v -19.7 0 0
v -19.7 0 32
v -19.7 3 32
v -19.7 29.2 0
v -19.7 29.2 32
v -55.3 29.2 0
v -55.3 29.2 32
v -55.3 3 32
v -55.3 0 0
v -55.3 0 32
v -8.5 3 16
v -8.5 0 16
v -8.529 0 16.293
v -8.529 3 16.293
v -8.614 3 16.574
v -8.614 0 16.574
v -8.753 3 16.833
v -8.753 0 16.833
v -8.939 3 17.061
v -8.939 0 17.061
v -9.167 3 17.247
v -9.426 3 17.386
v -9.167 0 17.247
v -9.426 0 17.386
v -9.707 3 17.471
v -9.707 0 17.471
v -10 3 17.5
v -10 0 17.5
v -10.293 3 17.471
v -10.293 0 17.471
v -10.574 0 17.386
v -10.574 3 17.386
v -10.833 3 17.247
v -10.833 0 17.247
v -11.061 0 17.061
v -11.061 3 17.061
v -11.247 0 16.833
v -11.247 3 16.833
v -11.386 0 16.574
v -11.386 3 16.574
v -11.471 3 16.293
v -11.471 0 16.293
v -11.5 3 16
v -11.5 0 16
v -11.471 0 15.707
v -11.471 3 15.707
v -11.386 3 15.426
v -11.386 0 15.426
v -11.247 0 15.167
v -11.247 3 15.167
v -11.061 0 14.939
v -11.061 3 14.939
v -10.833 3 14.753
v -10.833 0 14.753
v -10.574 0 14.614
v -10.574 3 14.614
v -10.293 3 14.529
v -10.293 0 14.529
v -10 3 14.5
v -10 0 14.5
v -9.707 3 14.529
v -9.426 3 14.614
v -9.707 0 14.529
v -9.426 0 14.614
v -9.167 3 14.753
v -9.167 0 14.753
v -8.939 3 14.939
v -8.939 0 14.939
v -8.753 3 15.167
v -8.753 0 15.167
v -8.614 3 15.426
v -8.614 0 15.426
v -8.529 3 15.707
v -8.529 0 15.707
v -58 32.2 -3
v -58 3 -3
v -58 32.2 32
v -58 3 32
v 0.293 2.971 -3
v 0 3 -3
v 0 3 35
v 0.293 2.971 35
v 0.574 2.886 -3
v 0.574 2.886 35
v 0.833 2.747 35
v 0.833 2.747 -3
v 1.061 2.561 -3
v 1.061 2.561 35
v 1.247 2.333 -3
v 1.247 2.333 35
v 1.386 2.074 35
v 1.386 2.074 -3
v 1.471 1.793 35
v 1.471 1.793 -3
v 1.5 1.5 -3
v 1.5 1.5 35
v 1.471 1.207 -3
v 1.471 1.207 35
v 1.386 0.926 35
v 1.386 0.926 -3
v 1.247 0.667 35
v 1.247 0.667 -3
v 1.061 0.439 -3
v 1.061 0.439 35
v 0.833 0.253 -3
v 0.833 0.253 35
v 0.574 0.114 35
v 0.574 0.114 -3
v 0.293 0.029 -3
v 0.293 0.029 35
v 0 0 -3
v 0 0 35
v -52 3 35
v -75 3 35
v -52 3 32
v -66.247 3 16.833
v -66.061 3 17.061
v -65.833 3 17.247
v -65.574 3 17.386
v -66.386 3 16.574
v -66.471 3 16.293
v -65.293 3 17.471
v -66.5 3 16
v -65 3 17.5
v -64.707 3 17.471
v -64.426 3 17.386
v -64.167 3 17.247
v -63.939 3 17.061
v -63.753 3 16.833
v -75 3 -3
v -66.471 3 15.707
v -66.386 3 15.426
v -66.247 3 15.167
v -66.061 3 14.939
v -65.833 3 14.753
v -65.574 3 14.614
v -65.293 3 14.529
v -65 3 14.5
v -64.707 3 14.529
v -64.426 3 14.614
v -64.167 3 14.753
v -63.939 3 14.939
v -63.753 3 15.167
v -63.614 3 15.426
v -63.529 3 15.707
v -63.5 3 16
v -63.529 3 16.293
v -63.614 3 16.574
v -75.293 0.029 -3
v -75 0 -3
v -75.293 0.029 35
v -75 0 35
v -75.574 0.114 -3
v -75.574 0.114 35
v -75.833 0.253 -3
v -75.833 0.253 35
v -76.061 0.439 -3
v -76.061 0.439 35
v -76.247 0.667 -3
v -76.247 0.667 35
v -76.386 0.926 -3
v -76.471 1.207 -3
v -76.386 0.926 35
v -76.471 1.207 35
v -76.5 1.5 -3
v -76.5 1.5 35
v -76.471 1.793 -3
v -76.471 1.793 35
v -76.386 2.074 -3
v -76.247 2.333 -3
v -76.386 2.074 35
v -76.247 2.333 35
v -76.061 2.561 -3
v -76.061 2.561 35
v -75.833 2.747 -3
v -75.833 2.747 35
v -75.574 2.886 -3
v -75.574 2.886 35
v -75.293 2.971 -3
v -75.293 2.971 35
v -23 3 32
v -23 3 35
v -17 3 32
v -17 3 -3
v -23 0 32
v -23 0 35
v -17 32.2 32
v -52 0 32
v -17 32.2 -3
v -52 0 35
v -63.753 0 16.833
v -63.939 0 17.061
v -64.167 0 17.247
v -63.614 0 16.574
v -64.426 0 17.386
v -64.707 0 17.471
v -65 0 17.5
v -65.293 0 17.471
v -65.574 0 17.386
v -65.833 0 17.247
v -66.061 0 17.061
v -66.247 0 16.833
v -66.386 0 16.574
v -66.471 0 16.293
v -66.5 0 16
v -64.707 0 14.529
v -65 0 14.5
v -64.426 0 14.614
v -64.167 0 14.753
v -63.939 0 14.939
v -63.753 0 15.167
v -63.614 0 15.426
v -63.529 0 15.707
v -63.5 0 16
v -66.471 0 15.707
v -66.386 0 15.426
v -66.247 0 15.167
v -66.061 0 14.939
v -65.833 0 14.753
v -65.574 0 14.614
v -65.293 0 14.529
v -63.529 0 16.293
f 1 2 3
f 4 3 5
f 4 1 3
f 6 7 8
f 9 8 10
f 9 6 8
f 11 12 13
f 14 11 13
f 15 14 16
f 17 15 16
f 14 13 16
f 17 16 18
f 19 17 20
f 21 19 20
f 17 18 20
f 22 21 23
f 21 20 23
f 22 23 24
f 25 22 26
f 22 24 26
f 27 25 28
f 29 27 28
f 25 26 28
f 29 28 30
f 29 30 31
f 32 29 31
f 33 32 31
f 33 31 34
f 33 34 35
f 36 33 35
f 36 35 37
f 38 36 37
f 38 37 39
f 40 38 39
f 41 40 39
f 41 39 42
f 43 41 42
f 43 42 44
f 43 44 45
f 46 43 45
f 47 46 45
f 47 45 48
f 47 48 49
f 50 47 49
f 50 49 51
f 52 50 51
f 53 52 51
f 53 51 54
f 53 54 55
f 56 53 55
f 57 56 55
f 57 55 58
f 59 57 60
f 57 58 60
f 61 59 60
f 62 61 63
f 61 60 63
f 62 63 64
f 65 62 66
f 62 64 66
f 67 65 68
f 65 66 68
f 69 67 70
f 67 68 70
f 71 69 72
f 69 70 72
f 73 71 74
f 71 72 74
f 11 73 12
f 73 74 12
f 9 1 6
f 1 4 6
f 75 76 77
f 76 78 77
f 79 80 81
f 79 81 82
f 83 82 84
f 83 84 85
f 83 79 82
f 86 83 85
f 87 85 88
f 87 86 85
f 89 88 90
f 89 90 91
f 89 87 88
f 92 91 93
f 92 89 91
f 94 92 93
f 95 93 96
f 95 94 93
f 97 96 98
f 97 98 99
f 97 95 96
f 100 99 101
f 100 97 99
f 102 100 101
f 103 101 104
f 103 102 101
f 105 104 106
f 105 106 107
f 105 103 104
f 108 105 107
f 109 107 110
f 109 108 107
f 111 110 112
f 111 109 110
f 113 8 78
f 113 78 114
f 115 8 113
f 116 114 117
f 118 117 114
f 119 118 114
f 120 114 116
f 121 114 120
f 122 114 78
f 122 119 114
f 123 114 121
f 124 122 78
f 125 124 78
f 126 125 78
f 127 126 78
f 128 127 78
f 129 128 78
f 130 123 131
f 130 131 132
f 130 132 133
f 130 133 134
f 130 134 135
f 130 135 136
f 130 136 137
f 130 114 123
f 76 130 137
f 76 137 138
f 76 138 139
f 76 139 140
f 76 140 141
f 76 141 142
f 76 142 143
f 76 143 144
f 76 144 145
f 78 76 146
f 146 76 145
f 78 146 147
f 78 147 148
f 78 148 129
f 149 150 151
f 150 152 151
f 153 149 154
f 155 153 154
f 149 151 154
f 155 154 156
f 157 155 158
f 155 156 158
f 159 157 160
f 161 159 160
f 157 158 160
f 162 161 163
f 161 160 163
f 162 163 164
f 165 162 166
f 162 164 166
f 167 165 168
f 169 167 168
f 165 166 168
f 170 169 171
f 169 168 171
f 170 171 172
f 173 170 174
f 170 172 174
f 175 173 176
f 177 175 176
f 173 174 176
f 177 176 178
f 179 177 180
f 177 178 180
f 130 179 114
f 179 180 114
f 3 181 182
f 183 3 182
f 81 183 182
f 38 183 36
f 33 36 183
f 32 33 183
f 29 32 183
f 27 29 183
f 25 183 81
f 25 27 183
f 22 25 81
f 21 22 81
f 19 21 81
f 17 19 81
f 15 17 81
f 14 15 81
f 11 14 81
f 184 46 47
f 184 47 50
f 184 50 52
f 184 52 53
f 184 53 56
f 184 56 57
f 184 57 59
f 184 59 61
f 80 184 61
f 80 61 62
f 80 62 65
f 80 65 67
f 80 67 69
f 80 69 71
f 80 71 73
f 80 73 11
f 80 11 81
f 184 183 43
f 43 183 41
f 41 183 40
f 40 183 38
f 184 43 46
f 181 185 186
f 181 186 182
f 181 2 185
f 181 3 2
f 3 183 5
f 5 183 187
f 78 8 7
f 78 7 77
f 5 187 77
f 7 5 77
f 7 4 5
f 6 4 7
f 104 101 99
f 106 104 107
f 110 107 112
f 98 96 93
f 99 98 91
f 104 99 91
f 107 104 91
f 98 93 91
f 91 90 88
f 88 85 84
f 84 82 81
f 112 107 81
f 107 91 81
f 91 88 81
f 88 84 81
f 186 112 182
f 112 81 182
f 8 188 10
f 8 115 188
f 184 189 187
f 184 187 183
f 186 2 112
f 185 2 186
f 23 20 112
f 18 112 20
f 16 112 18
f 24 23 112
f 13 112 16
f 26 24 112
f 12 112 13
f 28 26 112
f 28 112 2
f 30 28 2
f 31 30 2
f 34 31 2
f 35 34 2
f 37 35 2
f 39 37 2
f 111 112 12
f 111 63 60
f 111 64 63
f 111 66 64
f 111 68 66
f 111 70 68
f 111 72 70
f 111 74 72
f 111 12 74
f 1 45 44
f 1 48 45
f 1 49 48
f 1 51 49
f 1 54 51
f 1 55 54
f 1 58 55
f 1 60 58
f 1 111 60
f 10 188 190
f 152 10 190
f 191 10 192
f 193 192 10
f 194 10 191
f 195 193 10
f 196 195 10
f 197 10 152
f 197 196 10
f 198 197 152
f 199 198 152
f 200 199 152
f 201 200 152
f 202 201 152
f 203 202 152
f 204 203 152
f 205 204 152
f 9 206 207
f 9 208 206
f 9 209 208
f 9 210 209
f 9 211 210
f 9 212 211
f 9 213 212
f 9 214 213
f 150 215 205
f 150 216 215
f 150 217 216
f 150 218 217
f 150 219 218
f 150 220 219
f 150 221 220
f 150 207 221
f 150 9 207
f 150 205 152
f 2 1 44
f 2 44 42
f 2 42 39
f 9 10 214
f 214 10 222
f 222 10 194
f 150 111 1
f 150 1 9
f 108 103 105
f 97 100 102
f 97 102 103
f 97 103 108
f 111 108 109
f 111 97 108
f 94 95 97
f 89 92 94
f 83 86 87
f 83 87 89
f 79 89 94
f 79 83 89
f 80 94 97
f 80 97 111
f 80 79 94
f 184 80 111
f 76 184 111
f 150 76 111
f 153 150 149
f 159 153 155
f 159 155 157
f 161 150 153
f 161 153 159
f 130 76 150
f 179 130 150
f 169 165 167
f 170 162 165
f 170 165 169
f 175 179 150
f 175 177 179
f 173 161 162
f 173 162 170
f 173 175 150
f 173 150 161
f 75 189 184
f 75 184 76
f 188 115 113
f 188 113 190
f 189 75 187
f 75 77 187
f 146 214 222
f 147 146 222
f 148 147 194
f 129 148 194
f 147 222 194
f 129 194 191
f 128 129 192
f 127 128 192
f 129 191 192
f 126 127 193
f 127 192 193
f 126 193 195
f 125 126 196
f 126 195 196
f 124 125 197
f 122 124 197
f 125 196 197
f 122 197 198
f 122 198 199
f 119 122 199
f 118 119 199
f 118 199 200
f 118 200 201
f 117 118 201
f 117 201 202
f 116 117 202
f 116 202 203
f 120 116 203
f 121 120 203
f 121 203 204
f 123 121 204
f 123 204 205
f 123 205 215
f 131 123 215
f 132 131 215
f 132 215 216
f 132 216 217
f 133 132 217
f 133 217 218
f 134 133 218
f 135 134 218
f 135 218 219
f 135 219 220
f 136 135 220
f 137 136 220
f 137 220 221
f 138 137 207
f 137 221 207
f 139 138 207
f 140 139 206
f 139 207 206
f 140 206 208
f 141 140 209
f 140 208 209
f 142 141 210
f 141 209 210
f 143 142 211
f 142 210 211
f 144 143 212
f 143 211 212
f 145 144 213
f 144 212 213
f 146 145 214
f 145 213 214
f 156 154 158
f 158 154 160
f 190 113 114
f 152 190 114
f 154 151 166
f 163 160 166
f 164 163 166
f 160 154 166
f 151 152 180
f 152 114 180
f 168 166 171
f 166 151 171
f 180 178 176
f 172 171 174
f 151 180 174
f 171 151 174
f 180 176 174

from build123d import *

# Parameters (mm, degrees)
BOSS_EXTRUDE1_DEPTH = 32
SKETCH2_W           = 35.6
SKETCH2_H           = 29.2
BOSS_EXTRUDE2_DEPTH = 3
BOSS_EXTRUDE3_DEPTH = 3
SKETCH4_R           = 1.5
CUT_EXTRUDE1_DEPTH  = 4


with BuildPart() as part:
    # Sketch1 → Boss-Extrude1 (new body)
    with BuildSketch(Plane.XY):
        with BuildLine():
            Line((0, 0), (-19.7, 0))
            Line((-19.7, 0), (-19.7, 29.2))
            Line((-19.7, 29.2), (-20, 29.2))
            Line((-20, 29.2), (-55, 29.2))
            Line((-55, 29.2), (-55.3, 29.2))
            Line((-55.3, 29.2), (-55.3, 0))
            Line((-55.3, 0), (-75, 0))
            ThreePointArc((-75, 0), (-76.5, 1.5), (-75, 3))
            Line((-75, 3), (-58, 3))
            Line((-58, 3), (-58, 30.2))
            Line((-58, 30.2), (-58, 32.2))
            Line((-58, 32.2), (-17, 32.2))
            Line((-17, 32.2), (-17, 30.2))
            Line((-17, 30.2), (-17, 3))
            Line((-17, 3), (0, 3))
            ThreePointArc((0, 3), (1.5, 1.5), (0, 0))
        make_face()
    extrude(amount=BOSS_EXTRUDE1_DEPTH)

    # Sketch2 → Boss-Extrude2 (add)
    with BuildSketch(Plane(origin=(0, 0, 0), x_dir=(-1, 0, 0), z_dir=(0, 0, -1))):
        with Locations((37.5, 14.6)):
            Rectangle(SKETCH2_W, SKETCH2_H)
        with BuildLine():
            Line((17, 3), (0, 3))
            ThreePointArc((0, 3), (-1.5, 1.5), (0, 0))
            Line((0, 0), (19.7, 0))
            Line((19.7, 0), (19.7, 29.2))
            Line((19.7, 29.2), (55.3, 29.2))
            Line((55.3, 29.2), (55.3, 0))
            Line((55.3, 0), (75, 0))
            ThreePointArc((75, 0), (76.5, 1.5), (75, 3))
            Line((75, 3), (58, 3))
            Line((58, 3), (58, 32.2))
            Line((58, 32.2), (17, 32.2))
            Line((17, 32.2), (17, 3))
        make_face()
    extrude(amount=BOSS_EXTRUDE2_DEPTH)

    # Sketch3 → Boss-Extrude3 (add)
    with BuildSketch(Plane.XY.offset(32)):
        with BuildLine():
            Line((-20, 0), (-23, 0))
            Line((-23, 0), (-23, 3))
            Line((-23, 3), (-20, 3))
            Line((-20, 3), (0, 3))
            ThreePointArc((0, 3), (1.5, 1.5), (0, 0))
            Line((0, 0), (-20, 0))
        make_face()
        with BuildLine():
            Line((-55, 0), (-75, 0))
            ThreePointArc((-75, 0), (-76.5, 1.5), (-75, 3))
            Line((-75, 3), (-55, 3))
            Line((-55, 3), (-52, 3))
            Line((-52, 3), (-52, 0))
            Line((-52, 0), (-55, 0))
        make_face()
    extrude(amount=BOSS_EXTRUDE3_DEPTH)

    # Sketch4 → Cut-Extrude1 (cut)
    with BuildSketch(Plane.XZ):
        with Locations((-65, 16)):
            Circle(SKETCH4_R)
        with Locations((-10, 16)):
            Circle(SKETCH4_R)
    extrude(amount=-CUT_EXTRUDE1_DEPTH, mode=Mode.SUBTRACT)


solid = part.part
